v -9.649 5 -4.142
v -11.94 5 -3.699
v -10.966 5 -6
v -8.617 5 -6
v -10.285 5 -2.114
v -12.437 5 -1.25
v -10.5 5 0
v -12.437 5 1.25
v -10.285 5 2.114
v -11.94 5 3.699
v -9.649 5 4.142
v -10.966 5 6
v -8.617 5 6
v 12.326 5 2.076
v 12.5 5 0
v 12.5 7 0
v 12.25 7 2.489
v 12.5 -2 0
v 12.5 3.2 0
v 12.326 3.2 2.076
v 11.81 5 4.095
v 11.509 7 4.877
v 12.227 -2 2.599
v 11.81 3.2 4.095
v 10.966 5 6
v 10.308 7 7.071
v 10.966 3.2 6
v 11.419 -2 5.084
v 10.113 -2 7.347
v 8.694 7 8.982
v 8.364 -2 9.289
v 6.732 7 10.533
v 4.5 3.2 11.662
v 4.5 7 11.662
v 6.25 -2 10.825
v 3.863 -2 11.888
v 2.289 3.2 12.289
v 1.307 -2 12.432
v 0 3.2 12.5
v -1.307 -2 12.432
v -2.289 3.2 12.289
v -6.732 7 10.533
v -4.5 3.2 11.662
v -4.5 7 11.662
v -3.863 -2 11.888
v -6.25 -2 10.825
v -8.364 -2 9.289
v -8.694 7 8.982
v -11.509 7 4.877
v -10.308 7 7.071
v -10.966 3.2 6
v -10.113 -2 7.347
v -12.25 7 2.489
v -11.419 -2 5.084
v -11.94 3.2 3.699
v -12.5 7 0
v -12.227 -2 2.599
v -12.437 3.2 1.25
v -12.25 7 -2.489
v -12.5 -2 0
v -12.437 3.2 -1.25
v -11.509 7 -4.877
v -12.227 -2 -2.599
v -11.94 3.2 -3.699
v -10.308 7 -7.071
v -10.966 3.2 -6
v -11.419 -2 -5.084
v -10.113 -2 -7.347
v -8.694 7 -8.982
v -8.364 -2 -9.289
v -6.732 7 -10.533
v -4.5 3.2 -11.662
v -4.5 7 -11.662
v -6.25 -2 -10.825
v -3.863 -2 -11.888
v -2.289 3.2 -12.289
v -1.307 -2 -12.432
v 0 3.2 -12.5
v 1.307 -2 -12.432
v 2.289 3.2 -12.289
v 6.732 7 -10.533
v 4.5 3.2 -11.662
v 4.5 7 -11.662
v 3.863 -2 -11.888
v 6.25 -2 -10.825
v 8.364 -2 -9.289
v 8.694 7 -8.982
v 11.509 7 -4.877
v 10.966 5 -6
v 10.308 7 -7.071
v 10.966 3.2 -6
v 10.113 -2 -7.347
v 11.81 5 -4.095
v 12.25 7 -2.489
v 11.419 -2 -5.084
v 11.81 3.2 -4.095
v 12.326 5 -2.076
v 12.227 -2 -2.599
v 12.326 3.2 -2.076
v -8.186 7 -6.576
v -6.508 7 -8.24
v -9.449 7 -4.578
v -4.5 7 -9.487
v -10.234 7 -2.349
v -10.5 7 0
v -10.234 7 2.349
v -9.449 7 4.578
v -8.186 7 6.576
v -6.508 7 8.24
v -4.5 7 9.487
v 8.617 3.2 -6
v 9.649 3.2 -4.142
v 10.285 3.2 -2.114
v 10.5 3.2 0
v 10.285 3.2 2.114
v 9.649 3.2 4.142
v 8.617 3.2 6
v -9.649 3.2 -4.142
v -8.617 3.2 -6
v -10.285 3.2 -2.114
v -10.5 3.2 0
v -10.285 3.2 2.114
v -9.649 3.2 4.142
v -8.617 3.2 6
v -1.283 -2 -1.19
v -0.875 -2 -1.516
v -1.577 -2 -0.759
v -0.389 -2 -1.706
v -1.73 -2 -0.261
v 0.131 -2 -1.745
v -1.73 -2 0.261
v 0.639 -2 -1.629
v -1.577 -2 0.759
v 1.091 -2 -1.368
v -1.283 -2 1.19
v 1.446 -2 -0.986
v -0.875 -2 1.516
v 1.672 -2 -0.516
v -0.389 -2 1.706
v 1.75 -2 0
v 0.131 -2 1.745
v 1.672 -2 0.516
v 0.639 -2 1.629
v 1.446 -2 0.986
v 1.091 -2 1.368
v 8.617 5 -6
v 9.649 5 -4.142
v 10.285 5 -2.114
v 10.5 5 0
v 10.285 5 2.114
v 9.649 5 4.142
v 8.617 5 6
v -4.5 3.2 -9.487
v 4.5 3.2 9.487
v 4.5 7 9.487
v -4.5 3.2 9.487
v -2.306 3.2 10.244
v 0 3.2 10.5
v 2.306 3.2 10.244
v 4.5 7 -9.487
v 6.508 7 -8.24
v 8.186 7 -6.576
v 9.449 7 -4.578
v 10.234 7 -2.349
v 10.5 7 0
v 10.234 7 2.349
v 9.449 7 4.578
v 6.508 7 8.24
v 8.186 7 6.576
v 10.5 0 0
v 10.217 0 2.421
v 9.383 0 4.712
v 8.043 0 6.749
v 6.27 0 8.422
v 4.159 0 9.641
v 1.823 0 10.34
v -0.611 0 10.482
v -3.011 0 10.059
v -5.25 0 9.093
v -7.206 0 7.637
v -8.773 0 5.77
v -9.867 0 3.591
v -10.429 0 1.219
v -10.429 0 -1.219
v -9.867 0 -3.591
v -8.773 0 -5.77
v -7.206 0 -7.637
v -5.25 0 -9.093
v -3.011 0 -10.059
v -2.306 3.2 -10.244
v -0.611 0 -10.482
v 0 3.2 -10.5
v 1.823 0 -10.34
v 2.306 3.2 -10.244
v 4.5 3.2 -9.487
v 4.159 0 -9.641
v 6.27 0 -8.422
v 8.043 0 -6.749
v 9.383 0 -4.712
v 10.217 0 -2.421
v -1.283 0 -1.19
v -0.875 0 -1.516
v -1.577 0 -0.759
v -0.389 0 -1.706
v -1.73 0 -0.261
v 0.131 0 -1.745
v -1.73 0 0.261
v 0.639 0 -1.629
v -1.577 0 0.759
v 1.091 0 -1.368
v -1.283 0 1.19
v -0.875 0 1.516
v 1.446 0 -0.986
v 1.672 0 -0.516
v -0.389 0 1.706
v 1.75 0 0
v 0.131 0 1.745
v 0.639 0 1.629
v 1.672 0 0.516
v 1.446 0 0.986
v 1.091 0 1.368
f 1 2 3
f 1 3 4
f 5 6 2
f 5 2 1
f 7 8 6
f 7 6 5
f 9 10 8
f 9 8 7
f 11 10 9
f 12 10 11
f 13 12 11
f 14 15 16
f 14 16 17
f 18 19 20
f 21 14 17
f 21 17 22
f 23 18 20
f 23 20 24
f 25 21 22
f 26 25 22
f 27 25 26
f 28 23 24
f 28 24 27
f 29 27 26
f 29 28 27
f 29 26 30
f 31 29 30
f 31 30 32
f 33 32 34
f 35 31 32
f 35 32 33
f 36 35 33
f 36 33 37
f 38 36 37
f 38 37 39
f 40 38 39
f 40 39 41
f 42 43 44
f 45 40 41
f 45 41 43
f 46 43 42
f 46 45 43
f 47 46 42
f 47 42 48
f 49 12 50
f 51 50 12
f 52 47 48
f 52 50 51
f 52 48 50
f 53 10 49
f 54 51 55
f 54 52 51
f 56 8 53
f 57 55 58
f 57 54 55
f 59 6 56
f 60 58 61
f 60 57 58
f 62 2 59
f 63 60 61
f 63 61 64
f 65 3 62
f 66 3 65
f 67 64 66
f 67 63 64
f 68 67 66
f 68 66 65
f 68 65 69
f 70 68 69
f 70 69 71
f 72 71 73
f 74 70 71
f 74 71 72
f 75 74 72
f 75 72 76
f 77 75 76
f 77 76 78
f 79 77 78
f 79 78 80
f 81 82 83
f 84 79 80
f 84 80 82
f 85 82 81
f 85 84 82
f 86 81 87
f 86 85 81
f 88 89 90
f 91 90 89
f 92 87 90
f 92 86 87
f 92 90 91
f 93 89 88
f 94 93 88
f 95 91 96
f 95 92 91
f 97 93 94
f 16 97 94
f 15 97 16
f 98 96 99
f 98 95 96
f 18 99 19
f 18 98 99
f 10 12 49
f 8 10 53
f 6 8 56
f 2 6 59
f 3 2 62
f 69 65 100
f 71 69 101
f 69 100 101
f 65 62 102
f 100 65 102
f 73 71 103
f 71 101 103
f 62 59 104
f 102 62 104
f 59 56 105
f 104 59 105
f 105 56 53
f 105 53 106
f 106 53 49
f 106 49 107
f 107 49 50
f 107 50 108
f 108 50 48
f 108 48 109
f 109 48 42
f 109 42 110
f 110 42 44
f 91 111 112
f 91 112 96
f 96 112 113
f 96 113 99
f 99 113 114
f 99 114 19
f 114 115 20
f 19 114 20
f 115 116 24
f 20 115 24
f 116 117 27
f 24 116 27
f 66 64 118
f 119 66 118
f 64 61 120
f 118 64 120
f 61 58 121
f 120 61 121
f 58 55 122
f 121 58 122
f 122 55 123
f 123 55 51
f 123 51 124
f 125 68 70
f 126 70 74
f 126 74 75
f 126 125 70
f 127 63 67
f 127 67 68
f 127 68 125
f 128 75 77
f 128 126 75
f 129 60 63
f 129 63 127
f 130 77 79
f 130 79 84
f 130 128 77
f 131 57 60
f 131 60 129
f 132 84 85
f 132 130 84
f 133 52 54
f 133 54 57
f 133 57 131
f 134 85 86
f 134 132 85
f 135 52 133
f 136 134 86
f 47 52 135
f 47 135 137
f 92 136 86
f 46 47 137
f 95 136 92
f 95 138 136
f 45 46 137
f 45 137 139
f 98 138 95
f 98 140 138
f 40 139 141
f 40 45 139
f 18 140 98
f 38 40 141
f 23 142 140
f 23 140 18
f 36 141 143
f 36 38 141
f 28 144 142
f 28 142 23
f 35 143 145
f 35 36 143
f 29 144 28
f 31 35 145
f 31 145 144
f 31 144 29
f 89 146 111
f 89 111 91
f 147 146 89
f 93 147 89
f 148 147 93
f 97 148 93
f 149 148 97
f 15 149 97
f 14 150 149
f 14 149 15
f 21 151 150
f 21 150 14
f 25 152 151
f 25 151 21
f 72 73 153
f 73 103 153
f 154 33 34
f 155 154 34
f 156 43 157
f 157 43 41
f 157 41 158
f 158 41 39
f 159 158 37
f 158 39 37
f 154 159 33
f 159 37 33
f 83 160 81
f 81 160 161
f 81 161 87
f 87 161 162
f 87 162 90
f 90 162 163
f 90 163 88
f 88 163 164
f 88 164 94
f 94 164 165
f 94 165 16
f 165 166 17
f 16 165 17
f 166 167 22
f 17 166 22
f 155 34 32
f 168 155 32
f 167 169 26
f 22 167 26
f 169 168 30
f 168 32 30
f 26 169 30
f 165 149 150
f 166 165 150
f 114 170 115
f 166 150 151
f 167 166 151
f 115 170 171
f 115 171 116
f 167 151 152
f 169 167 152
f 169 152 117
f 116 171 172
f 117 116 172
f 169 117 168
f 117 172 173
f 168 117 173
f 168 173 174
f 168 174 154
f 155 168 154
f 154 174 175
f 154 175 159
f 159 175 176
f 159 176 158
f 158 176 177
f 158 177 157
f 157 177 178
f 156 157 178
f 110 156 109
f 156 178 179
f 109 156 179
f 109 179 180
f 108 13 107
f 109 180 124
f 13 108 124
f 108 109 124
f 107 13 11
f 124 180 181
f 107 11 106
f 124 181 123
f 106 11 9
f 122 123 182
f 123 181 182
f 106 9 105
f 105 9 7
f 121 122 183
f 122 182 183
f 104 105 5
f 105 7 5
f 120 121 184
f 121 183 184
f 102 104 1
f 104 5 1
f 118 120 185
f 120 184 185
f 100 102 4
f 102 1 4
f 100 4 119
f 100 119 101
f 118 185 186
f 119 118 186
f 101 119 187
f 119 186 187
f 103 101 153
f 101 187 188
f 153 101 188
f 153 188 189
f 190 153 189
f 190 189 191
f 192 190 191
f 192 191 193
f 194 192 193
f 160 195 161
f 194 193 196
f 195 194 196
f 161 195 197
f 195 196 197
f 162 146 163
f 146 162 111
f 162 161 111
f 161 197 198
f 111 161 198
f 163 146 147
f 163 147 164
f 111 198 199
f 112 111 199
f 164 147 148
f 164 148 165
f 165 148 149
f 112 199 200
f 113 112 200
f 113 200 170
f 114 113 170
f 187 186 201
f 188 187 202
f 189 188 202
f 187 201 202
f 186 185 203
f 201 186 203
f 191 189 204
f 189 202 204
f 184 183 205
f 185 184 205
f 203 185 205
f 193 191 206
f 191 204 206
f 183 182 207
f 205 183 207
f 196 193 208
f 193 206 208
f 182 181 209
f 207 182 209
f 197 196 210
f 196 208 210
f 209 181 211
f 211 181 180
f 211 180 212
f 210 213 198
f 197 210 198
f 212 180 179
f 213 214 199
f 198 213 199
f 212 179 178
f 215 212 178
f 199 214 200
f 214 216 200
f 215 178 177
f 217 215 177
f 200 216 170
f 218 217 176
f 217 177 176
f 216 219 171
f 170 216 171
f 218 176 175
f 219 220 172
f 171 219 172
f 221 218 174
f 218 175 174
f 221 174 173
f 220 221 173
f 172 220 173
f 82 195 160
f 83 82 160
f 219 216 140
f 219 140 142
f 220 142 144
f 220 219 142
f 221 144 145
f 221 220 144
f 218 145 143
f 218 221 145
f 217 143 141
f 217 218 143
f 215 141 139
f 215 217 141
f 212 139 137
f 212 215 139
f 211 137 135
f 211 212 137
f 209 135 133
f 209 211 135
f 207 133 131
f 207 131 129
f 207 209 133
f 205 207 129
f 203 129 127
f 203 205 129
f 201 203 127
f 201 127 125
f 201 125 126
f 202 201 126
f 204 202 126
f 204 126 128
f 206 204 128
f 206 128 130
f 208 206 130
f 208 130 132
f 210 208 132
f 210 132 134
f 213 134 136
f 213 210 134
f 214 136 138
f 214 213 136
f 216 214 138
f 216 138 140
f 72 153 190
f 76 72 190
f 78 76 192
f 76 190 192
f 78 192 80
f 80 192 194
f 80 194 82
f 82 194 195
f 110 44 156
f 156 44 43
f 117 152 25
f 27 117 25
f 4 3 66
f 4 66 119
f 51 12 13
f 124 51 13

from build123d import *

# Parameters (mm, degrees)
F0_R     = 12.5
F0_R_2   = 10.5
F0_R_3   = 1.75
F1_DEPTH = 2
F2_DEPTH = 7
F3_W     = 9
F3_H     = 1.8
F3_H_2   = 5.8387092426
F4_DEPTH = 15
F3_W_2   = 10.5
F3_H_3   = 0.2
F5_DEPTH = 6


with BuildPart() as f1:
    # F0 (on Front) → F1 (new body)
    with BuildSketch(Plane.XZ):
        Circle(F0_R)
        Circle(F0_R_2, mode=Mode.SUBTRACT)
        Circle(F0_R_2)
        Circle(F0_R_3, mode=Mode.SUBTRACT)
    extrude(amount=F1_DEPTH)

    # F0 (on Front) → F2 (join)
    with BuildSketch(Plane.XZ):
        Circle(F0_R)
        Circle(F0_R_2, mode=Mode.SUBTRACT)
    extrude(amount=-F2_DEPTH)

    # F3 (on Top) → F4 (cut, symmetric)
    with BuildSketch(Plane.XY):
        with Locations((0, 4.1)):
            Rectangle(F3_W, F3_H)
        with Locations((0, 7.9193546213)):
            Rectangle(F3_W, F3_H_2)
    extrude(amount=F4_DEPTH, both=True, mode=Mode.SUBTRACT)

    # F3 (on Top) → F5 (cut, symmetric)
    with BuildSketch(Plane.XY):
        with Locations((-9.75, 4.1)):
            Rectangle(F3_W_2, F3_H)
        with Locations((0, 7.9193546213)):
            Rectangle(F3_W, F3_H_2)
        with Locations((0, 4.1)):
            Rectangle(F3_W, F3_H)
        with Locations((9.75, 4.1)):
            Rectangle(F3_W_2, F3_H)
        with Locations((0, 3.1)):
            Rectangle(F3_W, F3_H_3)
    extrude(amount=F5_DEPTH, both=True, mode=Mode.SUBTRACT)


solid = f1.part
